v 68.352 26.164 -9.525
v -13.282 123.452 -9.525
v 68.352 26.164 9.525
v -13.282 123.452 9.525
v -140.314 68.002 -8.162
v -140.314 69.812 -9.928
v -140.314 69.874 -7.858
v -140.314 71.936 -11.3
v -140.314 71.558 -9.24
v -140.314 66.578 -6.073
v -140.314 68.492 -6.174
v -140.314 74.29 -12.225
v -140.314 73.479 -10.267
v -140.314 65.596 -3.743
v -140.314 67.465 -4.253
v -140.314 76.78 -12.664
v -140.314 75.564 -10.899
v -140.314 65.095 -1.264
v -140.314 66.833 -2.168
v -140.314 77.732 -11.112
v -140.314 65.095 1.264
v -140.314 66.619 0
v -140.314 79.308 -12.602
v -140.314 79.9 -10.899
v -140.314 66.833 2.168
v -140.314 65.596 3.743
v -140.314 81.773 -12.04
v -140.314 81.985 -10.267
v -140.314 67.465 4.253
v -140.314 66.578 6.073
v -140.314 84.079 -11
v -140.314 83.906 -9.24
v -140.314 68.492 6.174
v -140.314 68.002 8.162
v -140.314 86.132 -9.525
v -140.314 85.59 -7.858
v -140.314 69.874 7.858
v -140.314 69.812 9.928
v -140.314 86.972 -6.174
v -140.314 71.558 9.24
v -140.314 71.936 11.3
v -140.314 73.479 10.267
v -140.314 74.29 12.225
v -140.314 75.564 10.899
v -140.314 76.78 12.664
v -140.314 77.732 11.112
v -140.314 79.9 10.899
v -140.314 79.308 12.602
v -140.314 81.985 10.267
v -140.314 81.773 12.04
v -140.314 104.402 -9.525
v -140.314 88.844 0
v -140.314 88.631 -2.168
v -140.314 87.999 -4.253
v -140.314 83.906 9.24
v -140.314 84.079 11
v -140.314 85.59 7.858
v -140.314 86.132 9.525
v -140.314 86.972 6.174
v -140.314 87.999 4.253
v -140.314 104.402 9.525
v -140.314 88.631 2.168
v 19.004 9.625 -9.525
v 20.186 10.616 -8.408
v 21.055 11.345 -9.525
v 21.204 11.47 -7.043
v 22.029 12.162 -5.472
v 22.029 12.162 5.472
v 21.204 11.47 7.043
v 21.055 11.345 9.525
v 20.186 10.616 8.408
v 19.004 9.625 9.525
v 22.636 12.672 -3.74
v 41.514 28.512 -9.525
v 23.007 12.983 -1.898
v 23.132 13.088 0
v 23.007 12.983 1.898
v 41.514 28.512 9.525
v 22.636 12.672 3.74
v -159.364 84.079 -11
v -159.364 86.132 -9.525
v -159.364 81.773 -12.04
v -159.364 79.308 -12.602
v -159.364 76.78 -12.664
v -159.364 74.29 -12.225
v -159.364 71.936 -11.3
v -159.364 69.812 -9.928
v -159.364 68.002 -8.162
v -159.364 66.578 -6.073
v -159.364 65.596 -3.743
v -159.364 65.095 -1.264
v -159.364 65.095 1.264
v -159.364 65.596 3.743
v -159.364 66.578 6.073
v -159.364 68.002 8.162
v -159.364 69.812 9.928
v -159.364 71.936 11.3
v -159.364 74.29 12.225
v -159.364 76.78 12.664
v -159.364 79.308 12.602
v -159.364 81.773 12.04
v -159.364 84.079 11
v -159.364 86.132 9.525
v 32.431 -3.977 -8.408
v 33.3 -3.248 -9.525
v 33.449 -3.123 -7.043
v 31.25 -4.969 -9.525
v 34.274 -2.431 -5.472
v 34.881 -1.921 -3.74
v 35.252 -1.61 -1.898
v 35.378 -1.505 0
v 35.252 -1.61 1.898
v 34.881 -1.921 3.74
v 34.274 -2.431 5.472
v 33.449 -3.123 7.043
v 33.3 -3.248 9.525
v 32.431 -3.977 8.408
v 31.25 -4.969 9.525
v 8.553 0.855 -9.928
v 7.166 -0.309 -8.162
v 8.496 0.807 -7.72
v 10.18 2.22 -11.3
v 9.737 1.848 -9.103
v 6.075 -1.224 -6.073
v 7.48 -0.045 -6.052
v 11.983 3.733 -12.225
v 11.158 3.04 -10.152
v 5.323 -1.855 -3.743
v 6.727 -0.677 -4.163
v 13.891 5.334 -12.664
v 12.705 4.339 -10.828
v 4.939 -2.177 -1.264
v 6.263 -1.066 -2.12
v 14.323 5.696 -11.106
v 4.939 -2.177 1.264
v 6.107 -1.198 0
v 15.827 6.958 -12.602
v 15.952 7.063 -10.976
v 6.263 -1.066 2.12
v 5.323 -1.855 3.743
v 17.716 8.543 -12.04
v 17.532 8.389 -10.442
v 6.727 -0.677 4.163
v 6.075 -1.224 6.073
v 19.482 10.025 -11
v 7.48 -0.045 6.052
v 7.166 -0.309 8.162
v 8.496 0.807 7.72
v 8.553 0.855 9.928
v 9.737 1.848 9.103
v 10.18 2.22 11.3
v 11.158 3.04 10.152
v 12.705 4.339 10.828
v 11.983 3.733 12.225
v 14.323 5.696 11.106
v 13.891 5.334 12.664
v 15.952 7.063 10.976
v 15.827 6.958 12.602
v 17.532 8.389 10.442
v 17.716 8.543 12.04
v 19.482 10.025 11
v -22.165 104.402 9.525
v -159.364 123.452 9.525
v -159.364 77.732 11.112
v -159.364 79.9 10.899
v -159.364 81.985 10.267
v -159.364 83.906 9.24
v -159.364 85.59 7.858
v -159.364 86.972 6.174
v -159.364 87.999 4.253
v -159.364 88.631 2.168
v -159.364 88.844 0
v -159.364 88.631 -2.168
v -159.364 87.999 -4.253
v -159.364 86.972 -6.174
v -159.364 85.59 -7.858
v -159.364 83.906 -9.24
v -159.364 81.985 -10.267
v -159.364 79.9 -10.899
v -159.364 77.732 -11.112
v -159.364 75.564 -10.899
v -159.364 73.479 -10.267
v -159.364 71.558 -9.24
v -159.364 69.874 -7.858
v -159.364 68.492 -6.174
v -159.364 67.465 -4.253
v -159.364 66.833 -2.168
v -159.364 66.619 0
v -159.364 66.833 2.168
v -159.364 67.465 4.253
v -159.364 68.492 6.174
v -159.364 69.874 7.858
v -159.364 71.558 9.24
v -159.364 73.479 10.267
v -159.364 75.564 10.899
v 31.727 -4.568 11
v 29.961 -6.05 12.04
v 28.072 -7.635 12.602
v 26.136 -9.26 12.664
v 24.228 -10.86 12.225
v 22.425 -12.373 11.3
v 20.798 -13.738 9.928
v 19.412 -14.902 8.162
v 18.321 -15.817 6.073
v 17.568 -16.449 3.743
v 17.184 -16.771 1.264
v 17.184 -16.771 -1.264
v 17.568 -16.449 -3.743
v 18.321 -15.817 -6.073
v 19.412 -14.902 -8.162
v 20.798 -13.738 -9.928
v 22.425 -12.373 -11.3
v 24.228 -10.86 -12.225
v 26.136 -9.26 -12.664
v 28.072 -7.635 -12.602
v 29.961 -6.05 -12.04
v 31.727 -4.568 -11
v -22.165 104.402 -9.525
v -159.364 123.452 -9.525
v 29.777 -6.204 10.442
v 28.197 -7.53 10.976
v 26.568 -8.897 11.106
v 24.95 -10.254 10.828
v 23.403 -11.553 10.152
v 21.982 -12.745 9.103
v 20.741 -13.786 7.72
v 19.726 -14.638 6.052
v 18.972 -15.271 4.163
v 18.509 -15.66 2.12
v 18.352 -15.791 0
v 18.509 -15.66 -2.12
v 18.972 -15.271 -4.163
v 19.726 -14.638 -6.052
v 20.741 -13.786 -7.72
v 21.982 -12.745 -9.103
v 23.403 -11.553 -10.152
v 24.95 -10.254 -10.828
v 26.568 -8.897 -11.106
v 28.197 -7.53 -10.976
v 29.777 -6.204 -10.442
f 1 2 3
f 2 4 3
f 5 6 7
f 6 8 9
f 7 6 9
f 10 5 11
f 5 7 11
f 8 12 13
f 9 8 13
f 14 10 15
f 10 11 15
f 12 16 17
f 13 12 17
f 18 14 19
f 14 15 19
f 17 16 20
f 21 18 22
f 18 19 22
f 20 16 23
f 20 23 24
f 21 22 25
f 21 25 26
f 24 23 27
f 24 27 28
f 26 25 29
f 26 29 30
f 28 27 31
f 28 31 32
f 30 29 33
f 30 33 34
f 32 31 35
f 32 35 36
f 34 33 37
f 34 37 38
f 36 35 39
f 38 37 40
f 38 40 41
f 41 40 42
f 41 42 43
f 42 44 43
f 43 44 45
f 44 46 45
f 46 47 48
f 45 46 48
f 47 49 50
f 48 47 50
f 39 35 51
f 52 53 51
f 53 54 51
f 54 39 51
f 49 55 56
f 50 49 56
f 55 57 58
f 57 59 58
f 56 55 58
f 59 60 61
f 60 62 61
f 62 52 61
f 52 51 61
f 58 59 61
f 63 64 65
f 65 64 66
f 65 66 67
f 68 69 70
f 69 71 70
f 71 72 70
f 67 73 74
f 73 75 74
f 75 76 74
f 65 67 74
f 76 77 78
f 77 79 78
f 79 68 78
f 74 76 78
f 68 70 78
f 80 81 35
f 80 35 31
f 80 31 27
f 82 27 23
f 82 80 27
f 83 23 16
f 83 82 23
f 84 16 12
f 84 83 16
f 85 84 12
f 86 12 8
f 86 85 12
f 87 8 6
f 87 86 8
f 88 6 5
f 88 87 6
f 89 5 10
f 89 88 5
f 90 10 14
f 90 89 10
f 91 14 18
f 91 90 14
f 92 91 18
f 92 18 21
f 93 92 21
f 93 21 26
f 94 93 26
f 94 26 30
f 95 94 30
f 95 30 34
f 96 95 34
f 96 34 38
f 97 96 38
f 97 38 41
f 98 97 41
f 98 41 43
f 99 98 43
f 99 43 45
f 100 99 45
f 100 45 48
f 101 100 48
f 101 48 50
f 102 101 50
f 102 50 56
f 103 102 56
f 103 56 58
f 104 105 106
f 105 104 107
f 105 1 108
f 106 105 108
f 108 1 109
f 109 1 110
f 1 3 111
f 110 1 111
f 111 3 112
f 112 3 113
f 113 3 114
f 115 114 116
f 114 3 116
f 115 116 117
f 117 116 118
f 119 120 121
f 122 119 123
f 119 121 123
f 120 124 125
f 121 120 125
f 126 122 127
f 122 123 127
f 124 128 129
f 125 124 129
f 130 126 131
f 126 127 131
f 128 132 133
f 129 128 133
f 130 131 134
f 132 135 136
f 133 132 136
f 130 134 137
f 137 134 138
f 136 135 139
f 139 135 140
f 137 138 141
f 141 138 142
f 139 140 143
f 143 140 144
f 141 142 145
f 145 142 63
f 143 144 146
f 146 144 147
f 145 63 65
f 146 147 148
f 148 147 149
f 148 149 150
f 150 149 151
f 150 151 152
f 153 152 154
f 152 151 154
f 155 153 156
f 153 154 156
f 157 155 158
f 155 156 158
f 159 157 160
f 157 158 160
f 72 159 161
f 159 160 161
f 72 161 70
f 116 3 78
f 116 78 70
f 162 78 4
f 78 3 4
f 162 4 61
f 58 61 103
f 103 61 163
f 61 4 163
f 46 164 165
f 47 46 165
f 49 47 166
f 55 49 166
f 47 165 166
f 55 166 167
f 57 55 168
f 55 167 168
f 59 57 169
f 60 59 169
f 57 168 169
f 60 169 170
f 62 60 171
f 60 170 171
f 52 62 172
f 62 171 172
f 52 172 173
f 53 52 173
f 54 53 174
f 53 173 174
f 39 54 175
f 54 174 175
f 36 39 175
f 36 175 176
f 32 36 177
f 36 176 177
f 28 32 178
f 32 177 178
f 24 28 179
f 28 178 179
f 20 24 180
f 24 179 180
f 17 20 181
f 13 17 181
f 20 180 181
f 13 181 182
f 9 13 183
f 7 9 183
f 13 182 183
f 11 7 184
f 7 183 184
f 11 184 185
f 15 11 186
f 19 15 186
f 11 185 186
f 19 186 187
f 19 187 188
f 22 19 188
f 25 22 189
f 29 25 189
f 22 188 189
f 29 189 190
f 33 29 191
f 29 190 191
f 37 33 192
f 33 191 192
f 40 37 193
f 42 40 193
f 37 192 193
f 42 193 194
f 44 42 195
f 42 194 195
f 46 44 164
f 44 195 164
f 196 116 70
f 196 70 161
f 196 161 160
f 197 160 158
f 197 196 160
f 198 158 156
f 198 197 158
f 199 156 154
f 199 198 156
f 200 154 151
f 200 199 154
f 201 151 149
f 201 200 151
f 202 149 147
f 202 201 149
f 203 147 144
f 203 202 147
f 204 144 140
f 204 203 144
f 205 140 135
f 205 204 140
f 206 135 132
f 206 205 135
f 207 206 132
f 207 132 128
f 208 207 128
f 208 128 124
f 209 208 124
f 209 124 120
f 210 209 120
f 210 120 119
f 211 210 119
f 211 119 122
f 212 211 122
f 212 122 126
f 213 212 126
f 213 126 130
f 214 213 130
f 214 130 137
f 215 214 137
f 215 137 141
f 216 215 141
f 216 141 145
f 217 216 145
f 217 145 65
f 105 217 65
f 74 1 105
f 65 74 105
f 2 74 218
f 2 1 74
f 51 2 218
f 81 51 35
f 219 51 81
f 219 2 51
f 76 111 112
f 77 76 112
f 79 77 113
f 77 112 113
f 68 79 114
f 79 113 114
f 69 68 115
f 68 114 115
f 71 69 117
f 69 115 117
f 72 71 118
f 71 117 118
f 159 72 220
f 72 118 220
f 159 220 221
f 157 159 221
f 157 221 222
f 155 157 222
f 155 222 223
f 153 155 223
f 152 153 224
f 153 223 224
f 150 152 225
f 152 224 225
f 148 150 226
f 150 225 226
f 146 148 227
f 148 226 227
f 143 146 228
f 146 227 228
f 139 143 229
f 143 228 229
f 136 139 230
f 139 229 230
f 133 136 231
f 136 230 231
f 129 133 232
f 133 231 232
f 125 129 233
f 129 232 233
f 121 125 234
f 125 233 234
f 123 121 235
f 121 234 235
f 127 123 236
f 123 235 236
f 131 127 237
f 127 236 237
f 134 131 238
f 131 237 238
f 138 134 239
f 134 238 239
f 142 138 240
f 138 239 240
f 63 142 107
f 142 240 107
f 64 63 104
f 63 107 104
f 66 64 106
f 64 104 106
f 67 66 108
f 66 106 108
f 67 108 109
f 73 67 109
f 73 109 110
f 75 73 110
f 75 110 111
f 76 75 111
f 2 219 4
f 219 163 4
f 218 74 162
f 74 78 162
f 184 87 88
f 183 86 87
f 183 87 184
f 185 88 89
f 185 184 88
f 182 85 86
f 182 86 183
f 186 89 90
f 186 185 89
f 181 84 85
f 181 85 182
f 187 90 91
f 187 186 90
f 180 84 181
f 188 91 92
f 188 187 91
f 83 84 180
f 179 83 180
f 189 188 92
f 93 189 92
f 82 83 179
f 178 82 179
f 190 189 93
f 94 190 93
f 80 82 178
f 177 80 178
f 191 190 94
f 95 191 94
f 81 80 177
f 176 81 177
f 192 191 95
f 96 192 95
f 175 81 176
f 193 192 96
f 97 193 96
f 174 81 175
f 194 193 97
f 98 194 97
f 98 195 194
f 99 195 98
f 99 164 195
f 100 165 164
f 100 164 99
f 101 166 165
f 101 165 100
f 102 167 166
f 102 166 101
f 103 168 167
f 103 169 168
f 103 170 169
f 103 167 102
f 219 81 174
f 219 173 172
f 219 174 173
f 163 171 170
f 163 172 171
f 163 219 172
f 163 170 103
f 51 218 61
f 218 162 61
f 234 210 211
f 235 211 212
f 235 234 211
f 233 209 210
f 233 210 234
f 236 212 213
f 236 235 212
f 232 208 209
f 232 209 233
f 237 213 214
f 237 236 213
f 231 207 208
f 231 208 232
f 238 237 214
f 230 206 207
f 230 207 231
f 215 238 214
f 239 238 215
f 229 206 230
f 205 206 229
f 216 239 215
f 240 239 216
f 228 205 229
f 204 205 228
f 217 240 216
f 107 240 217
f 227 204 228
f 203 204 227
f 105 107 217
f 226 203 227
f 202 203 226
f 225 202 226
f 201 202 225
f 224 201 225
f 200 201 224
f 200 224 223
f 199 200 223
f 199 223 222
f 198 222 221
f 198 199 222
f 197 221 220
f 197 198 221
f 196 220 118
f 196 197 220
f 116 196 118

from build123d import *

# Parameters (mm, degrees)
BOSS_EXTRUDE1_DEPTH      = 9.525
BOSS_EXTRUDE1_DEPTH_BACK = 9.525
SKETCH2_R                = 12.7
BOSS_EXTRUDE2_DEPTH      = 19.05
SKETCH3_R                = 12.7
BOSS_EXTRUDE3_DEPTH      = 19.05
SKETCH4_R                = 11.1125
CUT_EXTRUDE1_DEPTH       = 19.05
SKETCH5_R                = 11.1125
CUT_EXTRUDE2_DEPTH       = 19.05


with BuildPart() as part:
    # Sketch1 → Boss-Extrude1 (new, two sides: drawn at the far end of the back side and taken through both)
    with BuildSketch(Plane.XY.offset(-BOSS_EXTRUDE1_DEPTH_BACK)):
        Polygon((14.619756732, 5.945361145), (41.514078034, 28.51237623), (-22.164858678, 104.401977829), (-140.313745495, 104.401977829), (-140.313745495, 77.731977829), (-159.363745495, 77.731977829), (-159.363745495, 123.451977829), (-13.281697791, 123.451977829), (68.35232864, 26.164333553), (26.864860696, -8.647785497), align=None)
    extrude(amount=BOSS_EXTRUDE1_DEPTH + BOSS_EXTRUDE1_DEPTH_BACK)

    # Sketch2 → Boss-Extrude2 (add)
    with BuildSketch(Plane.ZY.offset(159.363745495)):
        with Locations((0, 77.731977829)):
            Circle(SKETCH2_R)
    extrude(amount=-BOSS_EXTRUDE2_DEPTH)

    # Sketch3 → Boss-Extrude3 (add)
    with BuildSketch(Plane(origin=(15.358116398, -18.303090393, 0), x_dir=(0.7660444431189792, 0.6427876096865379, 0), z_dir=(0.6427876096865379, -0.7660444431189792, 0))):
        with Locations((15.020987883, 0)):
            Circle(SKETCH3_R)
    extrude(amount=-BOSS_EXTRUDE3_DEPTH)

    # Sketch4 → Cut-Extrude1 (cut)
    with BuildSketch(Plane(origin=(15.358116398, -18.303090393, 0), x_dir=(0.7660444431189792, 0.6427876096865379, 0), z_dir=(0.6427876096865379, -0.7660444431189792, 0))):
        with Locations((15.020987883, 0)):
            Circle(SKETCH4_R)
    extrude(amount=-CUT_EXTRUDE1_DEPTH, mode=Mode.SUBTRACT)

    # Sketch5 → Cut-Extrude2 (cut)
    with BuildSketch(Plane.ZY.offset(159.363745495)):
        with Locations((0, 77.731977829)):
            Circle(SKETCH5_R)
    extrude(amount=-CUT_EXTRUDE2_DEPTH, mode=Mode.SUBTRACT)


solid = part.part
